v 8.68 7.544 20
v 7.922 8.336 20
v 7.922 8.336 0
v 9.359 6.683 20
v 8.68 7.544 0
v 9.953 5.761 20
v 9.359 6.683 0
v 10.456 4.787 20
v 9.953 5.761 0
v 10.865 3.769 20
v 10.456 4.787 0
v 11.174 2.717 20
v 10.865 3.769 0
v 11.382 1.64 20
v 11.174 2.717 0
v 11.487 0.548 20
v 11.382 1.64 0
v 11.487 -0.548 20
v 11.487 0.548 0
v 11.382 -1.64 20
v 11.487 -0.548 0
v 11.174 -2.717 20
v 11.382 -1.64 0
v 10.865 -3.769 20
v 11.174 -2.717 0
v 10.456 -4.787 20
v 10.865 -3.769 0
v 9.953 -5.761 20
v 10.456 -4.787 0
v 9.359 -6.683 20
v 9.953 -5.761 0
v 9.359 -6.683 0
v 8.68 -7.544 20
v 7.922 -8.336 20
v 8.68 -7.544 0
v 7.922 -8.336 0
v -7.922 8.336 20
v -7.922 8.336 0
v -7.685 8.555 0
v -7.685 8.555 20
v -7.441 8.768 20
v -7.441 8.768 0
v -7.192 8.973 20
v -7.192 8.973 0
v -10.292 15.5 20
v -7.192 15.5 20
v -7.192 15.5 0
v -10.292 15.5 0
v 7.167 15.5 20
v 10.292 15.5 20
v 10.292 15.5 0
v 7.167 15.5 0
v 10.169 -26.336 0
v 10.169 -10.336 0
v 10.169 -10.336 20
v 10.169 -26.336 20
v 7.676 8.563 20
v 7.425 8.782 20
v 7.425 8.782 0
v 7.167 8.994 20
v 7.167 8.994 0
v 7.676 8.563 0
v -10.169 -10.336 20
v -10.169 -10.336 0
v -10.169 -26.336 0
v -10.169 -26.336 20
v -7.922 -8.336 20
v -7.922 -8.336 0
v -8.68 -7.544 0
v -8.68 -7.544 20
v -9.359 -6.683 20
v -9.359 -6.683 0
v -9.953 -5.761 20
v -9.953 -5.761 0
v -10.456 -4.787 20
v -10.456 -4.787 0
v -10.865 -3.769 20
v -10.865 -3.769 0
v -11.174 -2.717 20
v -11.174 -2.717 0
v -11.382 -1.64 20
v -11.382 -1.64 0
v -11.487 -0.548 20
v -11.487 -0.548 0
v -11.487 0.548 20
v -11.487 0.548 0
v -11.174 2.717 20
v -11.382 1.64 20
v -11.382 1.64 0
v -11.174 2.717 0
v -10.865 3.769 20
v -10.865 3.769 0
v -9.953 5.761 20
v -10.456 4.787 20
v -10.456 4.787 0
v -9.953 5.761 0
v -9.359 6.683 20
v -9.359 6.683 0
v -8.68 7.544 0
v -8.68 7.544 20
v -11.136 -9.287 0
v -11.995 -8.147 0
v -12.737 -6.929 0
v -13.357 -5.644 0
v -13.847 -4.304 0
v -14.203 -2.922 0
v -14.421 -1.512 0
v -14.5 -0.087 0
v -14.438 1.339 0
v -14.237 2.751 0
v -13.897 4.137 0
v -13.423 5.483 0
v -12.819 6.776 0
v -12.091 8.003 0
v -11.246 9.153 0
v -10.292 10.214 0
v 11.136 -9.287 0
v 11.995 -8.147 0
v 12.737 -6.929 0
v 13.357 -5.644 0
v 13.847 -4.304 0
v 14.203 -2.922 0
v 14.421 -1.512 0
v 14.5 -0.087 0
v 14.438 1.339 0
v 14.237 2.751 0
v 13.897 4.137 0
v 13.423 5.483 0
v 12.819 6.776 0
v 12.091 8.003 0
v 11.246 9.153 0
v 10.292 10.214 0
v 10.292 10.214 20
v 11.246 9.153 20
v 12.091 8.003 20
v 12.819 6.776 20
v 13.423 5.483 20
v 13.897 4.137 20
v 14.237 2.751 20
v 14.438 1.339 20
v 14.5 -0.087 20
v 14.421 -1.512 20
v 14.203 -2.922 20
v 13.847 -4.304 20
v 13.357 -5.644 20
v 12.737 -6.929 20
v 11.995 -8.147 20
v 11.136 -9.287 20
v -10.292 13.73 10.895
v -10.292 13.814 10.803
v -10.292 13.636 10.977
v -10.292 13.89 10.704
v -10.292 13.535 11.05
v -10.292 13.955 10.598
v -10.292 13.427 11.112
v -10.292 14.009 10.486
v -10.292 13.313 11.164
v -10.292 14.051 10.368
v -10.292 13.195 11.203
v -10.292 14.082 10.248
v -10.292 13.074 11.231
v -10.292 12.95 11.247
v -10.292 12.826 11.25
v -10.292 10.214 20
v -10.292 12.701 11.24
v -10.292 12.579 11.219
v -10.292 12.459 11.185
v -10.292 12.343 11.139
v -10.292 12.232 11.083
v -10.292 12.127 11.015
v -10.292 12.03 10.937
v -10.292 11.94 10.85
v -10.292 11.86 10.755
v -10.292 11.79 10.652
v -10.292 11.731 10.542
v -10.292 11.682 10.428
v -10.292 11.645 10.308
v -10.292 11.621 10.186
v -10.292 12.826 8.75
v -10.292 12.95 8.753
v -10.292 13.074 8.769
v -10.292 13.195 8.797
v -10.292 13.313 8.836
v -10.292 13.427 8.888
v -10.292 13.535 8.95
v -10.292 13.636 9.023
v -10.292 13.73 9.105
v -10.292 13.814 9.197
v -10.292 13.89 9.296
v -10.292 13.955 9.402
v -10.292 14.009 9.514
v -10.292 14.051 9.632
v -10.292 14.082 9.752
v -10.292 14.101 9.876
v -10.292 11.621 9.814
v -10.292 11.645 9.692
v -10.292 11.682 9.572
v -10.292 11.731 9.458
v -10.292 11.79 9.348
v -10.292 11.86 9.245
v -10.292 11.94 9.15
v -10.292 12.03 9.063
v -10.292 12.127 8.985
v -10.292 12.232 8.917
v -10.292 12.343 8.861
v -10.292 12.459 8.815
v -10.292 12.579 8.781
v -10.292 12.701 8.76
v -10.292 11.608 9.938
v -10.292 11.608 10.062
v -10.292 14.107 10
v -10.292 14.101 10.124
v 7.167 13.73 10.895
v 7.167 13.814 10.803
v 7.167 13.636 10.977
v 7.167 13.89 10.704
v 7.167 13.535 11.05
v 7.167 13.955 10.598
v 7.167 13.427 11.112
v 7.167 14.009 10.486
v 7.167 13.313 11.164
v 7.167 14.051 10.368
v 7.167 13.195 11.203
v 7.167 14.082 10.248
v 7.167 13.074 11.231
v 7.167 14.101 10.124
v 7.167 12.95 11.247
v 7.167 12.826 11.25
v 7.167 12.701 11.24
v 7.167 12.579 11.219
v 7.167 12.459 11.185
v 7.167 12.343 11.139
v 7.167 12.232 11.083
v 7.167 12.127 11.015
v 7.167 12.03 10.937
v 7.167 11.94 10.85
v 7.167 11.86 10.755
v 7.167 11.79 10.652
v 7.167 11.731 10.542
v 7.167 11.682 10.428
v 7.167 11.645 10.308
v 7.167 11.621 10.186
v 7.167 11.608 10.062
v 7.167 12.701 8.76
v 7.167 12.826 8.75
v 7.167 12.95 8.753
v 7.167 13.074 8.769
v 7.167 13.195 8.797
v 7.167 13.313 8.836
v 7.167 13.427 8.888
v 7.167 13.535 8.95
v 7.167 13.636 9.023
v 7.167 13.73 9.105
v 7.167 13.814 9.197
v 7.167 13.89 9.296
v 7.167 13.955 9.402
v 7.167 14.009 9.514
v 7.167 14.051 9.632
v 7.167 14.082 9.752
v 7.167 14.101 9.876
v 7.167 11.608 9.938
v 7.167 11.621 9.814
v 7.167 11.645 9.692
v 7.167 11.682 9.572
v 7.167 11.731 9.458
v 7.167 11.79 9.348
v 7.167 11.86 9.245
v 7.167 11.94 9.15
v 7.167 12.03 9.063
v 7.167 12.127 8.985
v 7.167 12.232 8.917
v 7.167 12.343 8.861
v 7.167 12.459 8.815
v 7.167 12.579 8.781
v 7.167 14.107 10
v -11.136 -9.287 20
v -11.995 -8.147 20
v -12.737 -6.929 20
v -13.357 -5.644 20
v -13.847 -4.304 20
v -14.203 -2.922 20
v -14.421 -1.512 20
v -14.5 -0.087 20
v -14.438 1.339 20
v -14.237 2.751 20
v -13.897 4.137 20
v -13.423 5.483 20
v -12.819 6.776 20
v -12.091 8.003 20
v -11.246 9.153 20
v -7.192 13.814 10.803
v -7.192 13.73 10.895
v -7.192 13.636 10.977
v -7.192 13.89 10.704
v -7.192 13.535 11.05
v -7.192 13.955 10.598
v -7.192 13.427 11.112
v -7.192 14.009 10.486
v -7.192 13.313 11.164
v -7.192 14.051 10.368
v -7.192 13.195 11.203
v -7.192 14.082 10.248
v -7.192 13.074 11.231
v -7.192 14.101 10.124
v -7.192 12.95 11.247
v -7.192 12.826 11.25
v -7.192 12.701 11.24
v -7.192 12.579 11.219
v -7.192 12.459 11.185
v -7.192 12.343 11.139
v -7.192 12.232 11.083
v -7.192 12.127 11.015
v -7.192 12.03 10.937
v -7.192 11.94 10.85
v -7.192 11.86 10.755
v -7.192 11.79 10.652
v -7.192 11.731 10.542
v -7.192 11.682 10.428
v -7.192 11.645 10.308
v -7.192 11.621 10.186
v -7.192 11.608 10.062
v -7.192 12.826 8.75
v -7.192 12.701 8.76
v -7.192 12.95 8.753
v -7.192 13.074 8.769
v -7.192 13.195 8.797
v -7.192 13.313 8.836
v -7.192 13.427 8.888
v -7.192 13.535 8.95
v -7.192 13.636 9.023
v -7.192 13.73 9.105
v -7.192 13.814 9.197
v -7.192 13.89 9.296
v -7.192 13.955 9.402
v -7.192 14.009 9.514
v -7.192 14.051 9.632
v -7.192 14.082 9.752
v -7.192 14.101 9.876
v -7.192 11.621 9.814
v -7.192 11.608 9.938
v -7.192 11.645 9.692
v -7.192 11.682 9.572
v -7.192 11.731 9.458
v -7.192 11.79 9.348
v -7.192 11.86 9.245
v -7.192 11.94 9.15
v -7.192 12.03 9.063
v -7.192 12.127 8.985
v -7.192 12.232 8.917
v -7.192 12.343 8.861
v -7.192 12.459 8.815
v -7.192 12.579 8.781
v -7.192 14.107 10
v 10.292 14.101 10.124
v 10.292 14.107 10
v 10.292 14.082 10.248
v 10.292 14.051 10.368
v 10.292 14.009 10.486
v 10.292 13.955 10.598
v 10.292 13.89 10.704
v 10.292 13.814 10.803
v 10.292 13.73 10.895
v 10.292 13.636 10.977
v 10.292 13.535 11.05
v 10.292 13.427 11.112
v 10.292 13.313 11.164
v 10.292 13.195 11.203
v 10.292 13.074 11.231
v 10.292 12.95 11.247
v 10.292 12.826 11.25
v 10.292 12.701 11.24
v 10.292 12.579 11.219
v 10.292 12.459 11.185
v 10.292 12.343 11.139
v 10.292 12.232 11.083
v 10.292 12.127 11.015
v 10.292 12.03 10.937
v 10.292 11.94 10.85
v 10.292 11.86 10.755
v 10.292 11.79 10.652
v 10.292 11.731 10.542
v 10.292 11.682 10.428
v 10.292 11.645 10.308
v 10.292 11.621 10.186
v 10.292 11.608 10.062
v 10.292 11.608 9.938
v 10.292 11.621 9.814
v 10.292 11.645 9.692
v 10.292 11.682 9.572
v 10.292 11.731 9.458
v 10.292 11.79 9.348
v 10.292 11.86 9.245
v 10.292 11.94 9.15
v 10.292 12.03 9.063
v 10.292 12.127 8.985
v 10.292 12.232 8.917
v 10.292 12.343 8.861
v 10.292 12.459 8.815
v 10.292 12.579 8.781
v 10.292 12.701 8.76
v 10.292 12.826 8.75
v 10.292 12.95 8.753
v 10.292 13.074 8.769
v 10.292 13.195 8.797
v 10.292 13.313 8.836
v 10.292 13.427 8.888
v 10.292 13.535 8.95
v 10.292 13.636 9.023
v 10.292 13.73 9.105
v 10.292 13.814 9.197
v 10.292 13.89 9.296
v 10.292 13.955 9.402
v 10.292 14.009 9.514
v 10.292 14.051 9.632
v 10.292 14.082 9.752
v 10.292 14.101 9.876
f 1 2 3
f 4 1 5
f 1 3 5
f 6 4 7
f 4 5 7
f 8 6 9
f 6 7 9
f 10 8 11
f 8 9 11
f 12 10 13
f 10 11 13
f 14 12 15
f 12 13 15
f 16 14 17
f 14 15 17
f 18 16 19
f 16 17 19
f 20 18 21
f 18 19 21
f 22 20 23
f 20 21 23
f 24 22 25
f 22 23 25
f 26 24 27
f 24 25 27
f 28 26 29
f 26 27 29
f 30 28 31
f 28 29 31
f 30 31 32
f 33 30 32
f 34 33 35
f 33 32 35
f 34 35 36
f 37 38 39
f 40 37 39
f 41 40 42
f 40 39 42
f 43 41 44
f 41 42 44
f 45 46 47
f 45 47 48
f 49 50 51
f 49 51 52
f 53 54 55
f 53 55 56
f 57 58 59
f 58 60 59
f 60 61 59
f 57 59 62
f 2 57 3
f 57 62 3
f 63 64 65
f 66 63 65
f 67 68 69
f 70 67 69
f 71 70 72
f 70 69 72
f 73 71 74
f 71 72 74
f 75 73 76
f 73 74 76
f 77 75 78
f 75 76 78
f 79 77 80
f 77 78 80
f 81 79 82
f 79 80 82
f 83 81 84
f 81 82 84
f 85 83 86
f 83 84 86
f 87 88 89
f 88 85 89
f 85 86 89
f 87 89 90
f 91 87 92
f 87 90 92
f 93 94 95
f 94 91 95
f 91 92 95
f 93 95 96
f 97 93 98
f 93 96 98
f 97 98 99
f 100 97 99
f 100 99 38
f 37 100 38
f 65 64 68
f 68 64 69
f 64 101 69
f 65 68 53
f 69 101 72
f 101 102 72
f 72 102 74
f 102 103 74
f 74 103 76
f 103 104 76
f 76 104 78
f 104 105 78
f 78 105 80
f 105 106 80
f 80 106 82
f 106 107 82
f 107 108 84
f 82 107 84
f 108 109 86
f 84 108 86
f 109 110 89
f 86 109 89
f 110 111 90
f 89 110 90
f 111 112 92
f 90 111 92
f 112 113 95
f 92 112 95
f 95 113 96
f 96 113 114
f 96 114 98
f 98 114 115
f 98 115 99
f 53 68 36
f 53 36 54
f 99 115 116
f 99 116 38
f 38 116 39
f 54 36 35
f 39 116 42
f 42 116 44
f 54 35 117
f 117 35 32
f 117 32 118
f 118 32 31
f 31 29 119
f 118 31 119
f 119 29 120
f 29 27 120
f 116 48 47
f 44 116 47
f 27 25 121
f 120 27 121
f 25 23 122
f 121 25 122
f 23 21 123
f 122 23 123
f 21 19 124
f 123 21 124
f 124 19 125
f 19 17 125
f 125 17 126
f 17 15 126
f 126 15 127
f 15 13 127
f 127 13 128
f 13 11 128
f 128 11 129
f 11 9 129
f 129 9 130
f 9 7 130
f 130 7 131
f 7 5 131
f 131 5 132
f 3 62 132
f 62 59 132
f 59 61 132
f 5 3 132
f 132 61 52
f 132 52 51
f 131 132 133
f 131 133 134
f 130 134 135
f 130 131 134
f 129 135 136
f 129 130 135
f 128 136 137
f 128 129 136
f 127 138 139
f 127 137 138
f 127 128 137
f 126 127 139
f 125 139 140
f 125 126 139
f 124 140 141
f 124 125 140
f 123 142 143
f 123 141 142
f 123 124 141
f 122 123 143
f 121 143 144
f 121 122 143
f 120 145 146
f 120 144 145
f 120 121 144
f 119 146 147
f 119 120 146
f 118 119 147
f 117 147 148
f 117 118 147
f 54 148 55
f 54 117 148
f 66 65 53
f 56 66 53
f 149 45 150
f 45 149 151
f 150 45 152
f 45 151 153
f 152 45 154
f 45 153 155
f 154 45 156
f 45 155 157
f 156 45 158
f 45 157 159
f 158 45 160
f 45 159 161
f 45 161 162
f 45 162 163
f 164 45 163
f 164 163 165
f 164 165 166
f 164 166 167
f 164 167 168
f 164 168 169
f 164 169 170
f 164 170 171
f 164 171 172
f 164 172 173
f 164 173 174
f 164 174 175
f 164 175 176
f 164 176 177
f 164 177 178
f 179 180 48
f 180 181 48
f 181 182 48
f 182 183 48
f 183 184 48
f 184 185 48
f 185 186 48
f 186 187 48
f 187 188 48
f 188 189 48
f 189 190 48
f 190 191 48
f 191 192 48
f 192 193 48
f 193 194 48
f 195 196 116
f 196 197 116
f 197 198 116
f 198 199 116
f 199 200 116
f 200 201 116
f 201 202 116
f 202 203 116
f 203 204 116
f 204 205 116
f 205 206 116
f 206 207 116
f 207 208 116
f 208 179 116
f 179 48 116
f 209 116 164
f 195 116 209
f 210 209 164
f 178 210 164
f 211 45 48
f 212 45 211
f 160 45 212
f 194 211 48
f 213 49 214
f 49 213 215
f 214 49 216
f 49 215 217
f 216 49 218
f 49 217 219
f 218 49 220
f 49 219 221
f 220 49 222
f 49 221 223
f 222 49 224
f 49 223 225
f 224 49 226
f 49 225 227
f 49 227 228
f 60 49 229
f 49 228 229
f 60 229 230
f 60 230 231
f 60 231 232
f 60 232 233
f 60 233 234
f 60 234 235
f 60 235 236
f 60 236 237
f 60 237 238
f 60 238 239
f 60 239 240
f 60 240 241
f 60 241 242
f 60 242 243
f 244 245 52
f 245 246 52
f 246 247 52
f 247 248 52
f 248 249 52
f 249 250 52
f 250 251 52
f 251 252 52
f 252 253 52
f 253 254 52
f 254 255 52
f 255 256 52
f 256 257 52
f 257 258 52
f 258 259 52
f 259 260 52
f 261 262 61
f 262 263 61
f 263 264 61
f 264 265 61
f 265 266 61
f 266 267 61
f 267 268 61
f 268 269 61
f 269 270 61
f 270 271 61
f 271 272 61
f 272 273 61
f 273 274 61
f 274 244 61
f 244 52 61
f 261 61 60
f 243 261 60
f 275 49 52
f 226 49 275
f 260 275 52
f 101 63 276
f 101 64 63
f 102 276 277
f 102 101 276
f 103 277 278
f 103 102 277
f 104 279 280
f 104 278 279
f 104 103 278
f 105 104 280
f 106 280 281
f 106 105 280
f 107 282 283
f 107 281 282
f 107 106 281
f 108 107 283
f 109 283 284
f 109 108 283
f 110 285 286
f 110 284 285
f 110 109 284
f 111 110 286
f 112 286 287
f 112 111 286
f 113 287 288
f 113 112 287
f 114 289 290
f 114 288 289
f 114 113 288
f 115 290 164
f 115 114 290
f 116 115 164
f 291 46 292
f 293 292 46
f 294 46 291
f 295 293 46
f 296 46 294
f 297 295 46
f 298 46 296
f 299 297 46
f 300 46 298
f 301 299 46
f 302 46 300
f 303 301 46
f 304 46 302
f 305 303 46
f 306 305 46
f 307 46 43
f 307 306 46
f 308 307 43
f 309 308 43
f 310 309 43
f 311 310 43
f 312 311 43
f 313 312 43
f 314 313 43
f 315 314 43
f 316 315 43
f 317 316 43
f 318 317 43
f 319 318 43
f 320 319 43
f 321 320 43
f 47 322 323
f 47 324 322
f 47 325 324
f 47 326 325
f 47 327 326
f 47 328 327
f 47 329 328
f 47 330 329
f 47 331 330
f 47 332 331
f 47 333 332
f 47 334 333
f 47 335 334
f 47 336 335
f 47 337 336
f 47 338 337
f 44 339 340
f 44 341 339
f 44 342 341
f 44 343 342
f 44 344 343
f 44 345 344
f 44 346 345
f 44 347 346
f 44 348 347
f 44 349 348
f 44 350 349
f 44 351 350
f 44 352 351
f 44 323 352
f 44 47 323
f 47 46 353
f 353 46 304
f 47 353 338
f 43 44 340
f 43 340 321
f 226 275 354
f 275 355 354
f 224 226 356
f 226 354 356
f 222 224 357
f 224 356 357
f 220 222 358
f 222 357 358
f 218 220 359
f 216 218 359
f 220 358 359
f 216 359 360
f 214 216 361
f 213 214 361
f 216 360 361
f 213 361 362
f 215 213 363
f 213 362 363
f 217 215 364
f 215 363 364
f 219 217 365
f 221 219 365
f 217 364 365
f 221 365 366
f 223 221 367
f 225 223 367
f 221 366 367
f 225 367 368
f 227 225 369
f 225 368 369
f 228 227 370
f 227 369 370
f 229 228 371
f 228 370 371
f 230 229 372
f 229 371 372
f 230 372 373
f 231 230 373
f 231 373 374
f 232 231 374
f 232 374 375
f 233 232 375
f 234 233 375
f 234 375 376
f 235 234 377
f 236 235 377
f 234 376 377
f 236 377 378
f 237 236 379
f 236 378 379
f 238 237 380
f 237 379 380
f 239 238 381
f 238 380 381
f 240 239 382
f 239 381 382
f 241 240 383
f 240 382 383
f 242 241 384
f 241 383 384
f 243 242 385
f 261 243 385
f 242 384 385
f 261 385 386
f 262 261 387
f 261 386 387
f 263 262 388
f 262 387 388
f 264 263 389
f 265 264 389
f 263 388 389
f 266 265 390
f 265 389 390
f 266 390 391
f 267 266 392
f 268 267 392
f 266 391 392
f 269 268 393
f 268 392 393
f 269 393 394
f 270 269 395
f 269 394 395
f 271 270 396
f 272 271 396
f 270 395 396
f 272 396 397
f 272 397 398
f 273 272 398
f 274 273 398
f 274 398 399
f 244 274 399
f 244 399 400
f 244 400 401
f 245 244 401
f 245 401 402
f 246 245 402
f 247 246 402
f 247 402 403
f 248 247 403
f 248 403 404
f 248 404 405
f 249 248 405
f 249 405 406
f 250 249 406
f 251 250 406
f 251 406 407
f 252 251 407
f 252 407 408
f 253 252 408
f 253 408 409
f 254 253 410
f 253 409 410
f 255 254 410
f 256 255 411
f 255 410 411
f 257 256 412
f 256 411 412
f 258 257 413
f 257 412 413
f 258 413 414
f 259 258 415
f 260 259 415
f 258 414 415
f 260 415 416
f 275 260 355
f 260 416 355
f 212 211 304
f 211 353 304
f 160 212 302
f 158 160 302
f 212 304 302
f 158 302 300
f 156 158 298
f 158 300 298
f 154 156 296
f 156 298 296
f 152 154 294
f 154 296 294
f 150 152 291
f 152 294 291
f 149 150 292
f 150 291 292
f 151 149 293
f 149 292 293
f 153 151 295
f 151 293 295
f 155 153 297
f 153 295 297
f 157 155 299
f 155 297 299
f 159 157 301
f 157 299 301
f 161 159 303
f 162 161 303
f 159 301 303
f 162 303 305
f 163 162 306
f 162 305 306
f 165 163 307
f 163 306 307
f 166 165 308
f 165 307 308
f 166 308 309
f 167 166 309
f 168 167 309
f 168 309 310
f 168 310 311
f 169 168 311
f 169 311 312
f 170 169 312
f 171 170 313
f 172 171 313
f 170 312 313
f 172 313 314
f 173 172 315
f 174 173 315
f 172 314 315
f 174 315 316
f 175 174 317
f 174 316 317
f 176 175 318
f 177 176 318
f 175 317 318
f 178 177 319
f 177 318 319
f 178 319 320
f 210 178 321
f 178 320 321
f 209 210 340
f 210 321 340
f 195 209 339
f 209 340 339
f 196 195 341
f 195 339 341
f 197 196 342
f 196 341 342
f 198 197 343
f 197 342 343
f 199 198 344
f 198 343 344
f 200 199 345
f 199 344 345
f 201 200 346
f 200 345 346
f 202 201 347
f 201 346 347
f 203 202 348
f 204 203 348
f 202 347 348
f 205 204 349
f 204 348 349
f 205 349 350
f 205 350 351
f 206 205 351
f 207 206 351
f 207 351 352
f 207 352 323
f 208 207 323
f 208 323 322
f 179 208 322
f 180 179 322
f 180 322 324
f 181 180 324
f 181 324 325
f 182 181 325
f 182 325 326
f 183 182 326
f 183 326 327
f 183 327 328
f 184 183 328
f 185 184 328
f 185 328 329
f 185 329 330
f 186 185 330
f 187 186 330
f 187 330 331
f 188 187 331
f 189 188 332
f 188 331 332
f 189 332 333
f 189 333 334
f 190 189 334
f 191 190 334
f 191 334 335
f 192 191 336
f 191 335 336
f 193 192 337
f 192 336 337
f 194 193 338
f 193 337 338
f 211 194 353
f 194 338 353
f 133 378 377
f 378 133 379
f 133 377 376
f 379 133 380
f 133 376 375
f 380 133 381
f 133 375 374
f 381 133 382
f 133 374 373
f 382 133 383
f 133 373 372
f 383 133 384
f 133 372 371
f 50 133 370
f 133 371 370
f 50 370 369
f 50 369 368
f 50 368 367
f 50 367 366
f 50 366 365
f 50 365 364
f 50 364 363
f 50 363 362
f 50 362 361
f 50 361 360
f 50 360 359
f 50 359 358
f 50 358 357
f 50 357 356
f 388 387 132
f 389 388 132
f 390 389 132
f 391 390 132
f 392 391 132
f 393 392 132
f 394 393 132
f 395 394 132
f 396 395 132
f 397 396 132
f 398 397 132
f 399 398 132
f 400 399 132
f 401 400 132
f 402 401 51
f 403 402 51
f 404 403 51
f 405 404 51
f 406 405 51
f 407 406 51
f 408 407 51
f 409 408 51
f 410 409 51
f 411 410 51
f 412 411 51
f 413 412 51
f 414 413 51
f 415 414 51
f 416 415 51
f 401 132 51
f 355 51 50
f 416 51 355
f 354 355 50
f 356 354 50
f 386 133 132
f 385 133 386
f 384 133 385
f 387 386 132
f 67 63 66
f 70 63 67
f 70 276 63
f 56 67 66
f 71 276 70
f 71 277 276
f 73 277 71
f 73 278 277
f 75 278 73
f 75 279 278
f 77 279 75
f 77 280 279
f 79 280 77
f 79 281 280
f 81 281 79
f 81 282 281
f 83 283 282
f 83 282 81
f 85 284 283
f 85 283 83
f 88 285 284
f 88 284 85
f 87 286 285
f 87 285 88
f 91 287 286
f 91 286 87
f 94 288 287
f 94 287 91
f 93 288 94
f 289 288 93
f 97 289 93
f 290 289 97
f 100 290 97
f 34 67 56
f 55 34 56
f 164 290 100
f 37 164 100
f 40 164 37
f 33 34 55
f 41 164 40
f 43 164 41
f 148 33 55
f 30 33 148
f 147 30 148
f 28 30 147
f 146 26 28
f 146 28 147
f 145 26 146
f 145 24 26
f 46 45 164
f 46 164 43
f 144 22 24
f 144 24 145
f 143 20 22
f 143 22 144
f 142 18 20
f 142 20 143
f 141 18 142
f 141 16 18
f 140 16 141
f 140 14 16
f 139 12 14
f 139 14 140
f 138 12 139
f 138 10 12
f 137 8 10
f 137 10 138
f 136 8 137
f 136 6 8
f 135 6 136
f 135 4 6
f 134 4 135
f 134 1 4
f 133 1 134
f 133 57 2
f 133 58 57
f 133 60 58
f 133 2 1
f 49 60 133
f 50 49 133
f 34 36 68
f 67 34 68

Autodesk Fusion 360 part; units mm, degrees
sketch "Sketch1" plane through (0, 0, 0) normal (0, 0, 1) x (1, 0, 0)
  arc A0 (7.9217, -8.3364) -> (7.9217, 8.3364) centre (0, 0) ccw
  line L0 (-7.1925, 15.5) -> (-10.2923, 15.5)
  line L1 (7.9217, -8.3364) -> (-7.9217, -8.3364)
  line L2 (7.1667, 15.5) -> (7.1667, 8.9938)
  line L3 (-10.2923, 15.5) -> (-10.2923, 10.2136)
  line L4 (10.2923, 15.5) -> (7.1667, 15.5)
  line L5 (7.9217, -8.3364) -> (-7.9217, -8.3364)
  line L6 (-10.2923, 15.5) -> (-10.2923, 10.2136)
  arc A1 (-10.2923, 10.2136) -> (-10.169, -10.3364) centre (0, 0) ccw
  line L7 (-7.1925, 15.5) -> (-7.1925, 8.9732)
  line L8 (10.2923, 10.2136) -> (10.2923, 15.5)
  arc A2 (-7.9217, 8.3364) -> (-7.9217, -8.3364) centre (0, 0) ccw
  circle A3 centre (0, 0) radius 11.5
  line L9 (-7.1925, 15.5) -> (-10.2923, 15.5)
  line L10 (10.2923, 10.2136) -> (10.2923, 15.5)
  line L11 (10.2923, 15.5) -> (7.1667, 15.5)
  arc A4 (10.169, -10.3364) -> (10.2923, 10.2136) centre (0, 0) ccw
  line L12 (10.169, -10.3364) -> (10.169, -26.3364)
  line L13 (-10.169, -10.3364) -> (-10.169, -26.3364)
  line L14 (-10.169, -26.3364) -> (10.169, -26.3364)
  dimension "d1" = 16
  dimension "d2" = 16
extrude "Extrude1" add sketch "Sketch1" along normal blind 20 contours L1 L5 A3 | A0 L0 L2 L3 L4 L6 A1 L7 L8 A2 A3 L9 L10 L11 A4 L12 L13 L14
sketch "Sketch2" plane through (10.2923, 0, 0) normal (1, 0, 0) x (0, 1, 0)
  line L0 (10.2136, 0) -> (15.5, 0)
  line L1 (15.5, 0) -> (15.5, 20)
  line L2 (15.5, 20) -> (10.2136, 20)
  line L3 (10.2136, 20) -> (10.2136, 0)
  line L4 (10.2136, 20) -> (15.5, 0) construction
  line L5 (10.2136, 0) -> (15.5, 20) construction
  circle A0 centre (12.8568, 10) radius 1.25
  dimension "d5" = 2.5
extrude "Extrude2" cut sketch "Sketch2" against normal blind 21 contours A0
